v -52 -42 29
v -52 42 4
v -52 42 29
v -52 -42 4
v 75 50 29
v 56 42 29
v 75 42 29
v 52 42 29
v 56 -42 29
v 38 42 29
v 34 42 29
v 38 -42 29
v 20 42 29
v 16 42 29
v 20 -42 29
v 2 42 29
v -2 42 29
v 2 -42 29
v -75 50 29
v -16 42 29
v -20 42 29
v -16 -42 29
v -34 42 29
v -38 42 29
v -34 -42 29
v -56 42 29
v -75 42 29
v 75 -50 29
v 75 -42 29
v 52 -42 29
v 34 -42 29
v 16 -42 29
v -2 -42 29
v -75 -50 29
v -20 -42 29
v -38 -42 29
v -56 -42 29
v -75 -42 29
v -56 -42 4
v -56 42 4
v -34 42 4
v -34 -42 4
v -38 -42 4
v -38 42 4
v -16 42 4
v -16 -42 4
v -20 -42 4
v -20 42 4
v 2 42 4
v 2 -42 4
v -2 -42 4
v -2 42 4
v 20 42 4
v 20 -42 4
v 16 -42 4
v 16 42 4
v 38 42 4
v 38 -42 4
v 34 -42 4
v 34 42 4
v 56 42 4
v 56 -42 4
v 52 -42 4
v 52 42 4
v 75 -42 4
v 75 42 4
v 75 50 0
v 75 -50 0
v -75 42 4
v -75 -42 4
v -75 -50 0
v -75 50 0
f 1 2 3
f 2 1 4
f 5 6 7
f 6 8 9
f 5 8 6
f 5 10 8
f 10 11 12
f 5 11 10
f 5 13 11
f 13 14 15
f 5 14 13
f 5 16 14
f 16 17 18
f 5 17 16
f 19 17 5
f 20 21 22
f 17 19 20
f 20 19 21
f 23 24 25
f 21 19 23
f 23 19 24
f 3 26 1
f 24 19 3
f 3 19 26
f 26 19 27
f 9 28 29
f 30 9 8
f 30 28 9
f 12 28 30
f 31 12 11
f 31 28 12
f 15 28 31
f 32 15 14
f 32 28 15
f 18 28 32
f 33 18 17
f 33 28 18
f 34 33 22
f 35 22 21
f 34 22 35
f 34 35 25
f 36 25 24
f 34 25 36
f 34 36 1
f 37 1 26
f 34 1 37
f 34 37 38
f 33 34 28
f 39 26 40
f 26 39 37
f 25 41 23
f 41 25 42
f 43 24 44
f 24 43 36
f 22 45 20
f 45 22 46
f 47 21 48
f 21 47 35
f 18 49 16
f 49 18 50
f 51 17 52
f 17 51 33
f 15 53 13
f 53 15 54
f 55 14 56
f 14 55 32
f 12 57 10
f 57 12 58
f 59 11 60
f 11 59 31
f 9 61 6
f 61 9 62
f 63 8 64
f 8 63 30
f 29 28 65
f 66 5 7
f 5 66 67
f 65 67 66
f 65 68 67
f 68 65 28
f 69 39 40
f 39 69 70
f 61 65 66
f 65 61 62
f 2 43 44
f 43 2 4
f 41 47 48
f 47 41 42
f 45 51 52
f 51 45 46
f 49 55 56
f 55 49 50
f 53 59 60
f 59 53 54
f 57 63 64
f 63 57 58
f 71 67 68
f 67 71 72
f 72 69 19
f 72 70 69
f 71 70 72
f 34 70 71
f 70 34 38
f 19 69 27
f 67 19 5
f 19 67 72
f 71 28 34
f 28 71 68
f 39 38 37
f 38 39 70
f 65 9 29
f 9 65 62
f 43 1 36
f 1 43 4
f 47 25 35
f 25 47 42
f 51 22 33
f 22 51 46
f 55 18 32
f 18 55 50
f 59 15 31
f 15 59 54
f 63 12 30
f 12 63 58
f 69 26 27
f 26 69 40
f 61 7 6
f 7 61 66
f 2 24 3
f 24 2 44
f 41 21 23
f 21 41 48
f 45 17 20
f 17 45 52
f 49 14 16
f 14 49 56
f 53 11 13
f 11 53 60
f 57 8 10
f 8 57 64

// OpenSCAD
$fn = 32;

// ----------------------------------------------------------------------
// Rib frame 150 x 100 x 29
// 7 ribs at 18 mm pitch
// ----------------------------------------------------------------------

// --- parameters (mm) ---
frame = [150, 100, 4];  // base plate size (x, y, z)
rail_w = 8;             // side rail width
ribs = 7;               // number of ribs
rib_t = 4;              // rib thickness
rib_h = 25;             // rib height above the base plate
pitch = 18;             // pitch between rib centres

// --- derived feature positions (mm) ---
span = (ribs - 1) * pitch;          // = 108   distance between the outer ribs
origin_x = -span / 2;               // = -54   X of the first rib
rib_len = frame[1] - 2 * rail_w + 2;  // = 86   rib length, 1 mm into each rail
feature_centers = [
  [origin_x + 0 * pitch, 0],
  [origin_x + 1 * pitch, 0],
  [origin_x + 2 * pitch, 0],
  [origin_x + 3 * pitch, 0],
  [origin_x + 4 * pitch, 0],
  [origin_x + 5 * pitch, 0],
  [origin_x + 6 * pitch, 0]
];   // rib centre line, drives the rib loop

// base plate, two side rails, then the ribs read straight off feature_centers
union() {
  translate([-frame[0] / 2, -frame[1] / 2, 0]) cube(frame);
  translate([-frame[0] / 2, -frame[1] / 2, 0]) cube([frame[0], rail_w, frame[2] + rib_h]);
  translate([-frame[0] / 2, frame[1] / 2 - rail_w, 0]) cube([frame[0], rail_w, frame[2] + rib_h]);
  for (centre = feature_centers)
    translate([centre[0] - rib_t / 2, centre[1] - rib_len / 2, frame[2] - 1])
      cube([rib_t, rib_len, rib_h + 1]);
}
